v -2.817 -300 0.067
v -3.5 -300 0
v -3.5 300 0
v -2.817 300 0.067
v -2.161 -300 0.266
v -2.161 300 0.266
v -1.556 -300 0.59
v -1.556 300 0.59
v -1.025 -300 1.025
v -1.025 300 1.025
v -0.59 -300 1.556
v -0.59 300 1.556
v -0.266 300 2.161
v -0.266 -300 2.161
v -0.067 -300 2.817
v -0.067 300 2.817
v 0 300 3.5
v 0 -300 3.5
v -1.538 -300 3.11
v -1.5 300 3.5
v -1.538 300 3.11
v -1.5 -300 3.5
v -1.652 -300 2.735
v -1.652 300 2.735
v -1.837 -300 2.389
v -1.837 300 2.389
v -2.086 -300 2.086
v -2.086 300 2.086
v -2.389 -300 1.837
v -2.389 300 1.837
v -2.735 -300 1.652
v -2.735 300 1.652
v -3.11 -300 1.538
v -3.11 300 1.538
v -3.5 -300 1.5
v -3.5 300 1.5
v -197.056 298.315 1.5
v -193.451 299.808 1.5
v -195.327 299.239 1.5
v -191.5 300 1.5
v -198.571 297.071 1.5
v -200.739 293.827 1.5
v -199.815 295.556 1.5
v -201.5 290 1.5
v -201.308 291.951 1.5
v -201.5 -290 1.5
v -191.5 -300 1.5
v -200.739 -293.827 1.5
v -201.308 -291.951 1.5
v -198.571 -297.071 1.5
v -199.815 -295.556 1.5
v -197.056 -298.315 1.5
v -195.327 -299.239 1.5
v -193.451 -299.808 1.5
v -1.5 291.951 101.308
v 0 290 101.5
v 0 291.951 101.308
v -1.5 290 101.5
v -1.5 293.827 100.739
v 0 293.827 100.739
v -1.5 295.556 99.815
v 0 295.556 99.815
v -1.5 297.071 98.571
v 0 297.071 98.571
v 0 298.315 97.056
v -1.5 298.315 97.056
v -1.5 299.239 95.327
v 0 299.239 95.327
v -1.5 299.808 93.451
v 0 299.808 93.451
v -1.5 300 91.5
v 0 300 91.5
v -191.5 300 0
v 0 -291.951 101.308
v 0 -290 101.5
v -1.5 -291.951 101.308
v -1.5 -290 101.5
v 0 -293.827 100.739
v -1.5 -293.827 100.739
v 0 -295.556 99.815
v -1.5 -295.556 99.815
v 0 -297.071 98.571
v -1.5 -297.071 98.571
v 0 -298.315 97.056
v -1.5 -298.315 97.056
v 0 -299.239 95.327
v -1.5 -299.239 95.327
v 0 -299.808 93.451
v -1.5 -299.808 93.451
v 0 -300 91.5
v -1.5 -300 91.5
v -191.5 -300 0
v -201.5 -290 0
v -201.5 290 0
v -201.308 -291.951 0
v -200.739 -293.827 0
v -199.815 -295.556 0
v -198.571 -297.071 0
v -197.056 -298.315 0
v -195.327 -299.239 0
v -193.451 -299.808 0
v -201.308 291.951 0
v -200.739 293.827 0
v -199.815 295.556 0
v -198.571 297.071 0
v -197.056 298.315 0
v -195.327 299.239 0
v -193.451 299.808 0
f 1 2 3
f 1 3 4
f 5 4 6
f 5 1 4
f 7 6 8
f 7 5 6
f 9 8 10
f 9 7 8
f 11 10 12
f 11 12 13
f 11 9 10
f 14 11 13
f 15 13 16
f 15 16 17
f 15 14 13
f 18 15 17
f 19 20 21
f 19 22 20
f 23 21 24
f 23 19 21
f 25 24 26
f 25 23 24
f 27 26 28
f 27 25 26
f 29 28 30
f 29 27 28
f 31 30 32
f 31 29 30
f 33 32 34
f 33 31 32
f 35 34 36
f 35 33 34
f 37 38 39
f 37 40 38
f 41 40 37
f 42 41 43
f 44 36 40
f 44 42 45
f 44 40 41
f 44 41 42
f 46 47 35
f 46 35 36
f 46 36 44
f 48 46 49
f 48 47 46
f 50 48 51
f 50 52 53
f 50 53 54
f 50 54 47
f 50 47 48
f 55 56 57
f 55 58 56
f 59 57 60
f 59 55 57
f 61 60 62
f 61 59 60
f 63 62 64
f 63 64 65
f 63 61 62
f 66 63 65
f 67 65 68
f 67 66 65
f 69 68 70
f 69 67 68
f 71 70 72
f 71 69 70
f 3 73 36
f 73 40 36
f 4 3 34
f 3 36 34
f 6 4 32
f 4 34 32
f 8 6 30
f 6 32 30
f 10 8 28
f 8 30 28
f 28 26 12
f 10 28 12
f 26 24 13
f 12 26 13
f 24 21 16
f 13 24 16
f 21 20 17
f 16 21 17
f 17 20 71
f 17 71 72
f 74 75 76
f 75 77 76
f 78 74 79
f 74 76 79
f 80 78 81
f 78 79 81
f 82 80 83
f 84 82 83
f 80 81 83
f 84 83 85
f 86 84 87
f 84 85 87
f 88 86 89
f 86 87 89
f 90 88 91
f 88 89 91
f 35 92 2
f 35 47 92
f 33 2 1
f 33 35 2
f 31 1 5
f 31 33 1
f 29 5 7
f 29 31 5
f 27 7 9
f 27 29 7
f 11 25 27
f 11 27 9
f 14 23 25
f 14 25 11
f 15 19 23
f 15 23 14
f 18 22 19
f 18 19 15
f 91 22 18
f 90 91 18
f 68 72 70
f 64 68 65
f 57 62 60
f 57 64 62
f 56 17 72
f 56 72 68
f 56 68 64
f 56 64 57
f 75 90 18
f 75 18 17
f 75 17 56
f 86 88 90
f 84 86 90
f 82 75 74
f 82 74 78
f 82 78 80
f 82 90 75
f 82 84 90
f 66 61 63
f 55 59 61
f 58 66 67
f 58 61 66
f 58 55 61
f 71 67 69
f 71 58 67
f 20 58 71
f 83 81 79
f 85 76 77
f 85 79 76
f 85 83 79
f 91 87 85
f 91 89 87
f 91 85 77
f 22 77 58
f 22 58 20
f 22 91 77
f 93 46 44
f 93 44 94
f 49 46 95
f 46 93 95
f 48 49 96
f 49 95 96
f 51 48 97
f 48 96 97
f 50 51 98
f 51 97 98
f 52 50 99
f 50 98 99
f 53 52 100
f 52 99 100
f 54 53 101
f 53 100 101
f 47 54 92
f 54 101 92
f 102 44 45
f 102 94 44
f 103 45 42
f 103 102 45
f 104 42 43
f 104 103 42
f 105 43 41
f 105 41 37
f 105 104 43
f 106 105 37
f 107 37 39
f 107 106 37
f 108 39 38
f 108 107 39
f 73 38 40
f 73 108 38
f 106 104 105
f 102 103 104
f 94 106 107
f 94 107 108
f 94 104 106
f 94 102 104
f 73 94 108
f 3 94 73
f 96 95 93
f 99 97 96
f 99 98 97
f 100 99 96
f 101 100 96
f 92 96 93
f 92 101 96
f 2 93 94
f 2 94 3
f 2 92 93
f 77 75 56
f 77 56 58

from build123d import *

# Parameters (mm, degrees)
F1_DEPTH = 300
F2_R     = 10


with BuildPart() as f1:
    # F0 (on Front) → F1 (new body, symmetric)
    with BuildSketch(Plane.XZ):
        with BuildLine():
            Line((-201.5, 1.5), (-201.5, 0))
            Line((-201.5, 0), (-3.5, 0))
            ThreePointArc((-3.5, 0), (-1.025126, 1.025126), (0, 3.5))
            Line((0, 3.5), (0, 101.5))
            Line((0, 101.5), (-1.5, 101.5))
            Line((-1.5, 101.5), (-1.5, 3.5))
            ThreePointArc((-1.5, 3.5), (-2.085786, 2.085786), (-3.5, 1.5))
            Line((-3.5, 1.5), (-201.5, 1.5))
        make_face()
    extrude(amount=F1_DEPTH, both=True)

    # F2
    f2_edges = [f1.edges().sort_by_distance(p)[0] for p in [
        (-0.75, -300, 101.5),
        (-0.75, 300, 101.5),
        (-201.5, -300, 0.75),
        (-201.5, 300, 0.75),
    ]]
    fillet(f2_edges, radius=F2_R)


solid = f1.part
